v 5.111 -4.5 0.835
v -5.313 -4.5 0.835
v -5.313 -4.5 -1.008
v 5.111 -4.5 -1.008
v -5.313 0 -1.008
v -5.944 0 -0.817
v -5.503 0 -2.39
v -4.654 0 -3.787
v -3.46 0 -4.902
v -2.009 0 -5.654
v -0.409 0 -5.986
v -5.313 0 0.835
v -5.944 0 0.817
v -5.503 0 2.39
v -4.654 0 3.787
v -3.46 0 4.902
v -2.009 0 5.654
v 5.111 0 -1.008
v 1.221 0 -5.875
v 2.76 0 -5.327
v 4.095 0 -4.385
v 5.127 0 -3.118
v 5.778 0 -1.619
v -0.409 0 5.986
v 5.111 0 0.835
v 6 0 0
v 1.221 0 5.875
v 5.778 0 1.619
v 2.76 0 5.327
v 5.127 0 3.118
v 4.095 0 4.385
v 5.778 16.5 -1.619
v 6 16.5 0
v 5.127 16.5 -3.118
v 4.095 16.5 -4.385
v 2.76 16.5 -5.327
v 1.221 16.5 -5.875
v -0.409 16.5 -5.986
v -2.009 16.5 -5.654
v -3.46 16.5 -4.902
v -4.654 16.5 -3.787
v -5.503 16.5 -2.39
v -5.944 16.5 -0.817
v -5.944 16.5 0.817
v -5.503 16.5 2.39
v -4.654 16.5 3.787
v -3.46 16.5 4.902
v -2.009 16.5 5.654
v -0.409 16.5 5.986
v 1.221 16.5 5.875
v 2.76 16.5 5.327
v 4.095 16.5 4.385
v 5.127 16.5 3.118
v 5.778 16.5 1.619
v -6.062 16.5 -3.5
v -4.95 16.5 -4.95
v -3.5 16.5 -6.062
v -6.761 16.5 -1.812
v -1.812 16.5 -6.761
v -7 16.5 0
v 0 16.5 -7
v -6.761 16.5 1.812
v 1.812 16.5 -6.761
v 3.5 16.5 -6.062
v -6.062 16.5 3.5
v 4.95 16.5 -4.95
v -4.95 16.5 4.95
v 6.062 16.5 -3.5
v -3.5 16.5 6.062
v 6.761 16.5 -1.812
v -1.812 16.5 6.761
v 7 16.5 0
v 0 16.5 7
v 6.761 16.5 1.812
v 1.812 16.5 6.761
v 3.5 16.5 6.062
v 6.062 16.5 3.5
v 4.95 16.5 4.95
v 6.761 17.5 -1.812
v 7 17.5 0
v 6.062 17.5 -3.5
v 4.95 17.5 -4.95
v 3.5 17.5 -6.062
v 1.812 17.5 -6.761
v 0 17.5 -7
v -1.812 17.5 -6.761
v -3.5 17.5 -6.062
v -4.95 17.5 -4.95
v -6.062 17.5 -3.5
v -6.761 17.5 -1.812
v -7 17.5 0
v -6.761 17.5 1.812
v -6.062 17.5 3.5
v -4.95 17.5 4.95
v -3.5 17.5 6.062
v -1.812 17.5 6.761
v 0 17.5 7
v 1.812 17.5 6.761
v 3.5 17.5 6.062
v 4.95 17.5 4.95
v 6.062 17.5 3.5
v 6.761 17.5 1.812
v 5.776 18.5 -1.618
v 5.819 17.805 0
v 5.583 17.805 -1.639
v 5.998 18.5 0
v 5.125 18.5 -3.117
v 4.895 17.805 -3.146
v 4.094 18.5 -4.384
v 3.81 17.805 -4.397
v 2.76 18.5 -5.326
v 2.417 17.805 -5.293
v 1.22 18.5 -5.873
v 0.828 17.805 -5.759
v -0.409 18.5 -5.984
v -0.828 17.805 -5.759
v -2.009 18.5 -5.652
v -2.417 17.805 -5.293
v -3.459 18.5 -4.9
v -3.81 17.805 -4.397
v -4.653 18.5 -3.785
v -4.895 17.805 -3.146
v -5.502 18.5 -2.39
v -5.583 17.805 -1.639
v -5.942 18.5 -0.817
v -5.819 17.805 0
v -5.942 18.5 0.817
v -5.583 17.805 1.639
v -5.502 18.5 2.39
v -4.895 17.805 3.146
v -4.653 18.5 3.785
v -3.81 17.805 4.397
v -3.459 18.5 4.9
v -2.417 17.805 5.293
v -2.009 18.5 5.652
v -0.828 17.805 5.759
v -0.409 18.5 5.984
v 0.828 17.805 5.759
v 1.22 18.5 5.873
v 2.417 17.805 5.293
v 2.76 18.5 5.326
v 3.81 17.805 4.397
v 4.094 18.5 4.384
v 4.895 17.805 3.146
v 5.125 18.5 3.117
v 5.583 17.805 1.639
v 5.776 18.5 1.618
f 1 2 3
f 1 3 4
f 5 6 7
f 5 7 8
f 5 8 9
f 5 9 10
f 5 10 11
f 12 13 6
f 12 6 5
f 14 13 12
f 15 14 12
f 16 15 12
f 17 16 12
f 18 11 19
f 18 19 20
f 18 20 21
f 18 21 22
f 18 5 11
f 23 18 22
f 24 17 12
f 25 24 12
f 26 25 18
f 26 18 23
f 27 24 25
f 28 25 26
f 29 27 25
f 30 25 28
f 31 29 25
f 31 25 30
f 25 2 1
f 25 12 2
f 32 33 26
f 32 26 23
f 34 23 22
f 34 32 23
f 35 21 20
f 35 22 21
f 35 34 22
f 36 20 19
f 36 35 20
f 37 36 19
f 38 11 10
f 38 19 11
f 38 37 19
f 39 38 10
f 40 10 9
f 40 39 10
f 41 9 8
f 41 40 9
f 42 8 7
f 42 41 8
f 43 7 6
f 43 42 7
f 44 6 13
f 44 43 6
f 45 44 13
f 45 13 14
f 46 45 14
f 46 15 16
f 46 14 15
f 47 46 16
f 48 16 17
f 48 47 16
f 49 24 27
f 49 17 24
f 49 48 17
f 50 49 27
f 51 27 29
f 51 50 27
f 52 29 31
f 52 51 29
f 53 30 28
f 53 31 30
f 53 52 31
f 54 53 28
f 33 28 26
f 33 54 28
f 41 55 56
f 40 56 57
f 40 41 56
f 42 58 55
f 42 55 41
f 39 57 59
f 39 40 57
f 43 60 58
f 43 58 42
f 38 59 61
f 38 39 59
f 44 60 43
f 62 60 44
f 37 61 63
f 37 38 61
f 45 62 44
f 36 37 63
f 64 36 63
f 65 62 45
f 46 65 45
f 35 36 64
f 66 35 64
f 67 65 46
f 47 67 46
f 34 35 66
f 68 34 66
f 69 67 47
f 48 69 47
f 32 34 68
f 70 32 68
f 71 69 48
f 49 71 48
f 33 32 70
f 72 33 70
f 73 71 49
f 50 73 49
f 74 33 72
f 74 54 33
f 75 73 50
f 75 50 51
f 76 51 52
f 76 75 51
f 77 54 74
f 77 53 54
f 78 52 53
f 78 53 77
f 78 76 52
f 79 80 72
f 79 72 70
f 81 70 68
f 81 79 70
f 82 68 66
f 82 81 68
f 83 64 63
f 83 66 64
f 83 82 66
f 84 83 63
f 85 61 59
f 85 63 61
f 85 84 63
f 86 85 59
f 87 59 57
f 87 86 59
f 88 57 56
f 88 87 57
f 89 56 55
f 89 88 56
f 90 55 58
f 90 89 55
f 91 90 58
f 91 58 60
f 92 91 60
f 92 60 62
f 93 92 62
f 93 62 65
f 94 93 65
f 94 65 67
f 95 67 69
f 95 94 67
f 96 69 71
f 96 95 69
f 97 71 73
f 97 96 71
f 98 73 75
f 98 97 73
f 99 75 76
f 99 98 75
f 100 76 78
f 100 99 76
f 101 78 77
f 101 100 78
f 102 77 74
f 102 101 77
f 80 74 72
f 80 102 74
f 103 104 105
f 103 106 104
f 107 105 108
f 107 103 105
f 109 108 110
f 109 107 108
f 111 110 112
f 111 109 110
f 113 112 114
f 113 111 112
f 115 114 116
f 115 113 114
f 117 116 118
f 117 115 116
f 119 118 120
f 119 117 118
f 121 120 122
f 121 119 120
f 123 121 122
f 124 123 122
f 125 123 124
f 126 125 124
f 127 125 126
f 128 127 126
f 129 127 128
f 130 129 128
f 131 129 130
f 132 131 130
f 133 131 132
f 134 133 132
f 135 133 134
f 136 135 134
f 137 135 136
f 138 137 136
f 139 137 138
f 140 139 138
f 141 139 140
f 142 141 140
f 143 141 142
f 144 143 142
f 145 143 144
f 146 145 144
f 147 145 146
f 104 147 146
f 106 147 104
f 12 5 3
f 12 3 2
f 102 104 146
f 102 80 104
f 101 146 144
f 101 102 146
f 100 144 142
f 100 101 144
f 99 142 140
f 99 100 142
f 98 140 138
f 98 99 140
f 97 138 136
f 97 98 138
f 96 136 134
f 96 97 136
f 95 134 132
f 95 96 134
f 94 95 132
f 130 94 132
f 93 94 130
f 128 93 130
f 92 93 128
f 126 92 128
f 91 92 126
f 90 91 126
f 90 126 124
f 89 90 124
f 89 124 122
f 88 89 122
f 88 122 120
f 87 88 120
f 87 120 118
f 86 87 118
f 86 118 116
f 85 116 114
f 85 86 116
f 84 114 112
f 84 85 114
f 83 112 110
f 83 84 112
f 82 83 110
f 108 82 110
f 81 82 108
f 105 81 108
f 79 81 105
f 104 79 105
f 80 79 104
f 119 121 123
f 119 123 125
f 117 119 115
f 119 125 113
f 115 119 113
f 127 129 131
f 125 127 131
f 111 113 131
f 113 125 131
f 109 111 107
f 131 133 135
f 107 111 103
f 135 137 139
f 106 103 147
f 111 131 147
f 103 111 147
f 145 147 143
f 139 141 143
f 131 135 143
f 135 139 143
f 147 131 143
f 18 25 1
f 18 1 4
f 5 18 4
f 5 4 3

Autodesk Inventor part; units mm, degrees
ref_plane "YZ Plane" through (0, 0, 0) normal (1, 0, 0) x (0, 1, 0)
ref_plane "XZ Plane" through (0, 0, 0) normal (0, 1, 0) x (-1, 0, 0)
ref_plane "XY Plane" through (0, 0, 0) normal (0, 0, 1) x (1, 0, 0)
sketch "Skizze1" plane through (0, 0, 0) normal (0, 0, 1) x (1, 0, 0)
  line L0 (0, 0) -> (6, 0)
  line L1 (6, 0) -> (6, 16.5)
  line L2 (6, 16.5) -> (7, 16.5)
  line L3 (7, 16.5) -> (7, 17.5)
  line L4 (7, 17.5) -> (5.8187, 17.8052)
  line L5 (5.8187, 17.8052) -> (5.9982, 18.5)
  line L6 (5.9982, 18.5) -> (0, 18.5)
  line L7 (0, 18.5) -> (0, 0)
  point P0 (6.5, 16.5)
  dimension "d0" = 6
  dimension "d1" = 16.5
  dimension "d2" = 7
  dimension "d3" = 1
  dimension "d4" = 2
revolve "Umdrehung1" add sketch "Skizze1" angle 360 about axis through (0, 18.5, 0) along (0, -1, 0)
sketch "Skizze2" plane through (0, 0, 0) normal (0, -1, 0) x (1, 0, 0)
  line L0 (-5.3128, 0.8351) -> (5.1112, 0.8351)
  line L1 (5.1112, 0.8351) -> (5.1112, -1.0078)
  line L2 (5.1112, -1.0078) -> (-5.3128, -1.0078)
  line L3 (-5.3128, -1.0078) -> (-5.3128, 0.8351)
  point P0 (0, 0)
extrude "Extrusion1" add sketch "Skizze2" along normal blind 4.5
properties part number "Knopf"
